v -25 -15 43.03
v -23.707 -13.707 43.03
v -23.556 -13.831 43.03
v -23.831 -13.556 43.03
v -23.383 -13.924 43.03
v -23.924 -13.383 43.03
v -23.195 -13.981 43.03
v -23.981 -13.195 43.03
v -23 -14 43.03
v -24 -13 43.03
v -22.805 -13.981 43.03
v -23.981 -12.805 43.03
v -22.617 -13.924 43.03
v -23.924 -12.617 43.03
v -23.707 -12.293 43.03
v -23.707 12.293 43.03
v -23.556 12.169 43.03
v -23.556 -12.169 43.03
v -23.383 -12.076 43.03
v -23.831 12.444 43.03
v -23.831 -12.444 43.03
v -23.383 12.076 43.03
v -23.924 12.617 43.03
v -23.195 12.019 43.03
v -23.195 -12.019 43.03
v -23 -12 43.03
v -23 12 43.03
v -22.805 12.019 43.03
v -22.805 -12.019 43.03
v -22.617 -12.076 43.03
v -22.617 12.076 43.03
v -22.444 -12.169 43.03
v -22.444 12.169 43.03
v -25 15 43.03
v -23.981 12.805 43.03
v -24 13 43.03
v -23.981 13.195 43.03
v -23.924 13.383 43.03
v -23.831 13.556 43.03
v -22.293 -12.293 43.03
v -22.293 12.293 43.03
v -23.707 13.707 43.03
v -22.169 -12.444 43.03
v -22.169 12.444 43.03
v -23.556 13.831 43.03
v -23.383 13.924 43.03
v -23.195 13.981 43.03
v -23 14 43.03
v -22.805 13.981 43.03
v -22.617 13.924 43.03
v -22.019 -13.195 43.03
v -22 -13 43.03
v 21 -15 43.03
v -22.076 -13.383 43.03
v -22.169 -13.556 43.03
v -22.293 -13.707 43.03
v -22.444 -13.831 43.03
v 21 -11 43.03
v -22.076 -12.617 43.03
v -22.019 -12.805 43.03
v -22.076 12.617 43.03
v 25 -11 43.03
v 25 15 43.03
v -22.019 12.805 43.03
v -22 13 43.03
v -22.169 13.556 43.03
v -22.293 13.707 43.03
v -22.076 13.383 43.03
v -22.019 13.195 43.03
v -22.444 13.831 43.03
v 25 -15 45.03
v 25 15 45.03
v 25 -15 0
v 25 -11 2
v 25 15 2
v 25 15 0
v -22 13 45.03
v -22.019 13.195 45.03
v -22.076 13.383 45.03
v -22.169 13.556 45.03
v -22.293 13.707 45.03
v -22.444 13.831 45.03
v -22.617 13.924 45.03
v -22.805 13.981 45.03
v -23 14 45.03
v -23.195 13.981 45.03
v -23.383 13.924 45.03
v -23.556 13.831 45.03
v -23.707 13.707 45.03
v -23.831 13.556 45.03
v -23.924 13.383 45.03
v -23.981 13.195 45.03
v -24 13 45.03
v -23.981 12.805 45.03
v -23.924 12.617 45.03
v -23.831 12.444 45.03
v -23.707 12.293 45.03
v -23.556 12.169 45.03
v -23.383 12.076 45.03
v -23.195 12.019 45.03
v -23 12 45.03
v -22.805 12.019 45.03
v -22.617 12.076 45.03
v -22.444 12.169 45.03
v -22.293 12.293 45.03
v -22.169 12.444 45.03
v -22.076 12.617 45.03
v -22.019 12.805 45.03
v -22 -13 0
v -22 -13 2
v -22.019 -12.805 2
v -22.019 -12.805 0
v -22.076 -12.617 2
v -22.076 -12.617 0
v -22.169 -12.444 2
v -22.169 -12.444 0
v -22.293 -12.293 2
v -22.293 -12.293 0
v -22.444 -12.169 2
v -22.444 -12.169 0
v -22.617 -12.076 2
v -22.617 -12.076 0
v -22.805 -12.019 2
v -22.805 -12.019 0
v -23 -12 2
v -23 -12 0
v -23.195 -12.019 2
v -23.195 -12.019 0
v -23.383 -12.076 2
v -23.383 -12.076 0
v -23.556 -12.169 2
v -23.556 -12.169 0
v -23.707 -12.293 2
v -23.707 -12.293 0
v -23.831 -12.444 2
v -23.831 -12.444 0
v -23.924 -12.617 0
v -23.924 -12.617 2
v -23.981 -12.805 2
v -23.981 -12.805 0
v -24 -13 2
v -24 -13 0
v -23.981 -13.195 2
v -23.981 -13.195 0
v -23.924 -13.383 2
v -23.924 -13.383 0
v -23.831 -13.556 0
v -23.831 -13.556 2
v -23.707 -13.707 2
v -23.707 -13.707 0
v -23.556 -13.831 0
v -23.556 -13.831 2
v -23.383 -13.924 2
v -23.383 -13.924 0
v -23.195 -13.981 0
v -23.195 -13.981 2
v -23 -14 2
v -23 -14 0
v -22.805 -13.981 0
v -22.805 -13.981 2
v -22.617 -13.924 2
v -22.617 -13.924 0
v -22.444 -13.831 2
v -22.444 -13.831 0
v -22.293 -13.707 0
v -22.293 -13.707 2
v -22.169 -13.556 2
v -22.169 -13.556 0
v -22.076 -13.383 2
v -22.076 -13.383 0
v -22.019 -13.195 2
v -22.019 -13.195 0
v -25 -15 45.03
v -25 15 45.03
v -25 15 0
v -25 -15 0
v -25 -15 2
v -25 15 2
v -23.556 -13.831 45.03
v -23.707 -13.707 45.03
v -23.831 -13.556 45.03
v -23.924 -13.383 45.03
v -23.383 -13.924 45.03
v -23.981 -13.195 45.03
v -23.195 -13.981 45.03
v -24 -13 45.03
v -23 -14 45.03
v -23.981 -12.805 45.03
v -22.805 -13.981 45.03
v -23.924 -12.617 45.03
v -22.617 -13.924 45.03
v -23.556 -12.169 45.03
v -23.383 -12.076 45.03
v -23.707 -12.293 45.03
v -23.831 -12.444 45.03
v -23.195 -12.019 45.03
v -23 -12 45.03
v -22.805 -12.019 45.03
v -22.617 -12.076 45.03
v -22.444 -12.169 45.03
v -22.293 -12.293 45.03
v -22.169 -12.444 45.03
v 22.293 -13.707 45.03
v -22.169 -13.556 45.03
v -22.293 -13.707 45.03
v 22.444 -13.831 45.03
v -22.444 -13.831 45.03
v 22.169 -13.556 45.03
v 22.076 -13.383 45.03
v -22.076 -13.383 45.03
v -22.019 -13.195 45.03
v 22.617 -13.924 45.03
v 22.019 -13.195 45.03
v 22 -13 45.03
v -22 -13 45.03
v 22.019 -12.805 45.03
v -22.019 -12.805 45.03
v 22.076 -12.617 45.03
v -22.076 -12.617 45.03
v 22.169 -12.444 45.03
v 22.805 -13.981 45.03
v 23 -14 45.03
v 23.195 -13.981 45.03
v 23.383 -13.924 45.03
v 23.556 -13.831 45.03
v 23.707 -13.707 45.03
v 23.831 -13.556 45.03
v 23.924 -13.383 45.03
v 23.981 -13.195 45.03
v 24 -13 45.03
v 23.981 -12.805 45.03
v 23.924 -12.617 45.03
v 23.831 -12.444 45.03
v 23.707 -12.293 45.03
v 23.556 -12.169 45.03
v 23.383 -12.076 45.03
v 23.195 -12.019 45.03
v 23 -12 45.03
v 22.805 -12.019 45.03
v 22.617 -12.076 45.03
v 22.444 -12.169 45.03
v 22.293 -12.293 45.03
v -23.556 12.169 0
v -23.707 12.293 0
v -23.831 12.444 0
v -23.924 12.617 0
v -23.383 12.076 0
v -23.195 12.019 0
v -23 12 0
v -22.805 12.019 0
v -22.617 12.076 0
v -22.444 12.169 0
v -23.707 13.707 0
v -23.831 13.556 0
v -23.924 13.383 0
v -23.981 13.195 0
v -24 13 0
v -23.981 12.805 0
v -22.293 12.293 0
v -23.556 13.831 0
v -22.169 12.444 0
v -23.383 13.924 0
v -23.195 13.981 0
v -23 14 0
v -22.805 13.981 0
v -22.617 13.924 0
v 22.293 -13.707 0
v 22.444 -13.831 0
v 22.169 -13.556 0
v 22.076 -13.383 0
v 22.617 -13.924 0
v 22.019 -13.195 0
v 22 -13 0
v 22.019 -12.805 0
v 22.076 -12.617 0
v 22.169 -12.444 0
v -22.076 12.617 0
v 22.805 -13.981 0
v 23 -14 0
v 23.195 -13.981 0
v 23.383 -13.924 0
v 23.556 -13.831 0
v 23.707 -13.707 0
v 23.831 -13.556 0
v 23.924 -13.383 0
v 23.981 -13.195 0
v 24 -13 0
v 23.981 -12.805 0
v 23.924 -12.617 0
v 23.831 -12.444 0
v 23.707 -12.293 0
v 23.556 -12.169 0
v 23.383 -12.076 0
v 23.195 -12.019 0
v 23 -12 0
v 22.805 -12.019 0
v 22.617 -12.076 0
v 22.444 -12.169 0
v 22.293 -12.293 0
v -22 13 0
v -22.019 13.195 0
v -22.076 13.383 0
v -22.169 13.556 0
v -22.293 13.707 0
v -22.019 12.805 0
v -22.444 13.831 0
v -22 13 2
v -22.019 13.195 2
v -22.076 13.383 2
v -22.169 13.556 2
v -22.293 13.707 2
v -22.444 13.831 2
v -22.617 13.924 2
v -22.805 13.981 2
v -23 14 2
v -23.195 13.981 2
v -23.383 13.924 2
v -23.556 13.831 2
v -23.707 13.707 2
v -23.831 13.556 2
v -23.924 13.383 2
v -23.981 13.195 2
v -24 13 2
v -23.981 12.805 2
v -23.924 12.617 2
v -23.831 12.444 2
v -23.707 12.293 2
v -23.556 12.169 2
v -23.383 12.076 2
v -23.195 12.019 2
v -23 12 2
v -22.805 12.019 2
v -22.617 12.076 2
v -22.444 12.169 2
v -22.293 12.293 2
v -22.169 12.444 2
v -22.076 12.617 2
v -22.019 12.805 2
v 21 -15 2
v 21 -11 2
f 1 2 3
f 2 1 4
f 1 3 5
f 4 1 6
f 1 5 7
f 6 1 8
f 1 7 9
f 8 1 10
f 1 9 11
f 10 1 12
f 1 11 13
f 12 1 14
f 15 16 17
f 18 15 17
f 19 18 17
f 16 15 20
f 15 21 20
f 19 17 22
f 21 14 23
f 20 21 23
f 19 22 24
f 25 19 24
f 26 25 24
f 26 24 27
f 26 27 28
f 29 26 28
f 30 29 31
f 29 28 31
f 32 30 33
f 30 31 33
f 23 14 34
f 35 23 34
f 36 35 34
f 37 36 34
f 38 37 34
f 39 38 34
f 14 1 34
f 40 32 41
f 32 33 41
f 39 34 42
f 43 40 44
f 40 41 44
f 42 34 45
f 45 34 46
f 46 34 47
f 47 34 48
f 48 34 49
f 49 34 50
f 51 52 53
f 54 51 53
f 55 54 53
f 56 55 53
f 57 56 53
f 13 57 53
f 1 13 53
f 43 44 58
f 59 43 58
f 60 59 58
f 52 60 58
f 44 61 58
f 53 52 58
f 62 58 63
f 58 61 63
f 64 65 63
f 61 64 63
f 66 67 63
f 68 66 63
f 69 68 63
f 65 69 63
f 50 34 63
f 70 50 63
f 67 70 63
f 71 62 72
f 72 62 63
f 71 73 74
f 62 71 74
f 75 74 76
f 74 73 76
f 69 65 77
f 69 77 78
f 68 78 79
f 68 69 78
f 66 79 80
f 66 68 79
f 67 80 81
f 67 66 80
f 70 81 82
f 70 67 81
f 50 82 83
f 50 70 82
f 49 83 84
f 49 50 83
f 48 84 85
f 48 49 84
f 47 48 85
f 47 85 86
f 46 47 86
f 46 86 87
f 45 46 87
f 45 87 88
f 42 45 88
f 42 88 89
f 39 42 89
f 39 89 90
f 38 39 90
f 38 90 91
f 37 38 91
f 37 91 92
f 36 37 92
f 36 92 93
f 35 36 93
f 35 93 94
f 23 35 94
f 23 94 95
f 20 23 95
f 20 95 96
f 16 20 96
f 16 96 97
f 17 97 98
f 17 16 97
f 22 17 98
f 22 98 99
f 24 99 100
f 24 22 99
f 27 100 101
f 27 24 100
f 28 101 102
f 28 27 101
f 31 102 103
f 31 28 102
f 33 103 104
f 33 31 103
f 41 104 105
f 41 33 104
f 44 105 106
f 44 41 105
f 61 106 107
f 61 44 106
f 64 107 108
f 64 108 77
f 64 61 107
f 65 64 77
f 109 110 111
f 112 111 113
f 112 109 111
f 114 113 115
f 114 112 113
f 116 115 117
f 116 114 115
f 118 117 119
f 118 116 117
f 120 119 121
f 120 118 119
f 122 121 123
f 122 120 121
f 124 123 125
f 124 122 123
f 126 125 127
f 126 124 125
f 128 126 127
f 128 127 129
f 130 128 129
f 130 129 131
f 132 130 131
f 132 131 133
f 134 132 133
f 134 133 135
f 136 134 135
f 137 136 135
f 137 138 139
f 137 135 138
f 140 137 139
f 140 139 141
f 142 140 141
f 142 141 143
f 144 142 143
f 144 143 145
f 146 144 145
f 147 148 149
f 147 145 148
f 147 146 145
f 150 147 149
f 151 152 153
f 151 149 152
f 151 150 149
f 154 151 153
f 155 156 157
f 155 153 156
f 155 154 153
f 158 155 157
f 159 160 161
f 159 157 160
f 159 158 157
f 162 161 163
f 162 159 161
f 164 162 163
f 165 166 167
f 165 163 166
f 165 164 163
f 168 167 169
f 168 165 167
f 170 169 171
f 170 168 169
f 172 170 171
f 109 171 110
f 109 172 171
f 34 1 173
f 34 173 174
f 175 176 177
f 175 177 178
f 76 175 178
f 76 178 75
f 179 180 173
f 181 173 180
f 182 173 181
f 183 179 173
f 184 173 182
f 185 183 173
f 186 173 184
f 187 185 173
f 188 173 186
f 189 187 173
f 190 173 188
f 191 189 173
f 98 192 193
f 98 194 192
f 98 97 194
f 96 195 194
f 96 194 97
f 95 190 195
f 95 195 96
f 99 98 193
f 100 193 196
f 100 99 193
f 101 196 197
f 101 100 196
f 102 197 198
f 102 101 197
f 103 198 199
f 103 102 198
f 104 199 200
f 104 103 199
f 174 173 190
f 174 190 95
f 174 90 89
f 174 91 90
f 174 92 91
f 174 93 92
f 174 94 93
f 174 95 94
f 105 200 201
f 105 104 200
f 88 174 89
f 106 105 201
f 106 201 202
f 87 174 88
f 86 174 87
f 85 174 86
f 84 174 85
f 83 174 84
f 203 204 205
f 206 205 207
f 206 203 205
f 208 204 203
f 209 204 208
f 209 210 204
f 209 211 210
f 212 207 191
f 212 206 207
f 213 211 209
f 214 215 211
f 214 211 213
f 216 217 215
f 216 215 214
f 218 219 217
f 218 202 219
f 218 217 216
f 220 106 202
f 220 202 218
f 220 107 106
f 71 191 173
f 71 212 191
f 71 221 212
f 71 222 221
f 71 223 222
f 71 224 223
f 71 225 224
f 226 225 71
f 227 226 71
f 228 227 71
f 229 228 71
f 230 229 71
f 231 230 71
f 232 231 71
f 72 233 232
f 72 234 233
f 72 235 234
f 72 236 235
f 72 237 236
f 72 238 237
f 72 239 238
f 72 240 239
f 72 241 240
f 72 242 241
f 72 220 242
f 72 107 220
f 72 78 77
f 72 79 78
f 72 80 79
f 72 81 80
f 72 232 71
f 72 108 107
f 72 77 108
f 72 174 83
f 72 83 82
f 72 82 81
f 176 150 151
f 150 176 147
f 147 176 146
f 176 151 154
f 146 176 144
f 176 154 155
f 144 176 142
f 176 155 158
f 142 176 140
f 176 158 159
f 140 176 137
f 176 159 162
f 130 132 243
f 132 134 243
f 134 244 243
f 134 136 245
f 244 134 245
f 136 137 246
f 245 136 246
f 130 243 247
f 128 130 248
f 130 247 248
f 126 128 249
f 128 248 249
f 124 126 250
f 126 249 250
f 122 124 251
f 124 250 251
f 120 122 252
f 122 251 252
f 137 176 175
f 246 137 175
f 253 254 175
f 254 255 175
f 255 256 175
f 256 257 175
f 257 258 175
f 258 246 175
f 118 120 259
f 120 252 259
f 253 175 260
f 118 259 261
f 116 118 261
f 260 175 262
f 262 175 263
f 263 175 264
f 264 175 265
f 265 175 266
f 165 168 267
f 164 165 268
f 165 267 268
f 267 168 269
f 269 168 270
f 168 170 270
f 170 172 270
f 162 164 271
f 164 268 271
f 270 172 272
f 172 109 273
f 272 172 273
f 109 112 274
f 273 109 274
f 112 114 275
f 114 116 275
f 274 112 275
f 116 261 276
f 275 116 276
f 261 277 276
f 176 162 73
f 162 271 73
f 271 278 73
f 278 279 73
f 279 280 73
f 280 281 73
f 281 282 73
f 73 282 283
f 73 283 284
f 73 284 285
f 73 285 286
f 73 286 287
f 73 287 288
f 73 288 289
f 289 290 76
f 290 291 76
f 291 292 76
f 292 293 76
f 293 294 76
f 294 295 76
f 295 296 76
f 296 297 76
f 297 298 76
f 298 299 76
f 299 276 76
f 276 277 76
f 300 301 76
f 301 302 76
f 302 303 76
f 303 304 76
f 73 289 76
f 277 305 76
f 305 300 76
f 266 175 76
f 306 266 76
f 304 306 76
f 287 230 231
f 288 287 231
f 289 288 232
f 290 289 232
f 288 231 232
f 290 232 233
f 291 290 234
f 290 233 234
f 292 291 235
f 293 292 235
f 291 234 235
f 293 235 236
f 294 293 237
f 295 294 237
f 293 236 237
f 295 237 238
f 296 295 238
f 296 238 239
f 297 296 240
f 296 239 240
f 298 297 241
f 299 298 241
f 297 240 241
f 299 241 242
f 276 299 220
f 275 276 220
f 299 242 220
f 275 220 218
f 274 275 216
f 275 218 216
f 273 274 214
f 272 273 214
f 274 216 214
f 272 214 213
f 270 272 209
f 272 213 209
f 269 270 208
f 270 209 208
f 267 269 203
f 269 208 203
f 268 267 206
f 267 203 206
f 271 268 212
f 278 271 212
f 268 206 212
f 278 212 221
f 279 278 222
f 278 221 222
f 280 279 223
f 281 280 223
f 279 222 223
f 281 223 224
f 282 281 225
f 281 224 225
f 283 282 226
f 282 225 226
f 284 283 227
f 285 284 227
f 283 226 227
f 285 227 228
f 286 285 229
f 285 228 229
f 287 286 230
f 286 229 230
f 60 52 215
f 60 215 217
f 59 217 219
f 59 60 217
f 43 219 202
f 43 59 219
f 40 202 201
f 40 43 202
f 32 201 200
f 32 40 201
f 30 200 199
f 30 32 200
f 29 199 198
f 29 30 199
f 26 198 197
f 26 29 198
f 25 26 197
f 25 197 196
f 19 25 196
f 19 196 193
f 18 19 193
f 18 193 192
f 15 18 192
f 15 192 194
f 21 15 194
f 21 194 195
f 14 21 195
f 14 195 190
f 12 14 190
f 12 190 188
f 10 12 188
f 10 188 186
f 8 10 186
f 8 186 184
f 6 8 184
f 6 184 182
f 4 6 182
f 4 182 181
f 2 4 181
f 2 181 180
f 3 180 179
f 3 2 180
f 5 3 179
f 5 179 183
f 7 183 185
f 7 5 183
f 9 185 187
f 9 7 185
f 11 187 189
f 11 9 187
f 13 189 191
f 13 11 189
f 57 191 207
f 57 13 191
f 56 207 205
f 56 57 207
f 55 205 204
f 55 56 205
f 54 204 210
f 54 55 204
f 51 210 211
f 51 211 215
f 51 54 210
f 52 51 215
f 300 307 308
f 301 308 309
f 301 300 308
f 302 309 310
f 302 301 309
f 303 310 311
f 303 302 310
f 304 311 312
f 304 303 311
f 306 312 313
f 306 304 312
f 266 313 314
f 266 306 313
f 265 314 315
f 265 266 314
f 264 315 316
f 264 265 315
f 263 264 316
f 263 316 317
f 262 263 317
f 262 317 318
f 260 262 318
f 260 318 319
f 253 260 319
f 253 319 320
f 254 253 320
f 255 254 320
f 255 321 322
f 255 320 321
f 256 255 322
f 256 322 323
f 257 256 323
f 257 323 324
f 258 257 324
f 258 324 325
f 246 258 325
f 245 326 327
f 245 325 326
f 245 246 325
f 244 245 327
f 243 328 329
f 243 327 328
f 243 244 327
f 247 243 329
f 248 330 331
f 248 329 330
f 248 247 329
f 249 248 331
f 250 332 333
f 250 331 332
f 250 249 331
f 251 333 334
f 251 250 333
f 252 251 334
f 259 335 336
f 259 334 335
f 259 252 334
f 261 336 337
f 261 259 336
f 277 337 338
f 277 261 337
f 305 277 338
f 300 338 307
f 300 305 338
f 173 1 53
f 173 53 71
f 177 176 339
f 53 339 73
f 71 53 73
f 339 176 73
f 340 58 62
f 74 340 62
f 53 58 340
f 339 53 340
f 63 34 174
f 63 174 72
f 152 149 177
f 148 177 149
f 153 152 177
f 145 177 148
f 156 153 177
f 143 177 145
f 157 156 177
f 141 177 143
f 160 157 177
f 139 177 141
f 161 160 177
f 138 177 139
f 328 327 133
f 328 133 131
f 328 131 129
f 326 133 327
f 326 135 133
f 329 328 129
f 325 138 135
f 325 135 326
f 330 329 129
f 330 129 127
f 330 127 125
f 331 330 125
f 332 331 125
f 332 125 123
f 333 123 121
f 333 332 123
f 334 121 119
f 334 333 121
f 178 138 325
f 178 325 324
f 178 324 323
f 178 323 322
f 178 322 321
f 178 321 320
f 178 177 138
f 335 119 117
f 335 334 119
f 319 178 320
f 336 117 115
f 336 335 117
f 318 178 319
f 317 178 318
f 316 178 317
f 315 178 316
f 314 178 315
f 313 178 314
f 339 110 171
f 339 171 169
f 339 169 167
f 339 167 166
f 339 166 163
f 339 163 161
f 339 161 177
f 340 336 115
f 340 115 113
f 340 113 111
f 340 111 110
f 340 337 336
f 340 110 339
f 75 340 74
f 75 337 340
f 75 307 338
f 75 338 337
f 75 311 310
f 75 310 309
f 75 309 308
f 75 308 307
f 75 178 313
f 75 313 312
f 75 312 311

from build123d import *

# Parameters (mm, degrees)
SKETCH_1_W          = 50
SKETCH_1_H          = 30
SKETCH_1_R          = 1
EXTRUDE_1_DEPTH     = 45.03
SKETCH_2_W          = 46
SKETCH_2_H          = 41.03
CUT_EXTRUDE_1_DEPTH = 45.03
SKETCH_3_R          = 1
CUT_EXTRUDE_2_DEPTH = 45.03
SKETCH_4_W          = 4
SKETCH_4_H          = 41.03
CUT_EXTRUDE_3_DEPTH = 26


with BuildPart() as part:
    # 草图1 → 凸台-拉伸1 (new body)
    with BuildSketch(Plane.XY):
        Rectangle(SKETCH_1_W, SKETCH_1_H)
        with Locations((-23, -13)):
            Circle(SKETCH_1_R, mode=Mode.SUBTRACT)
        with Locations((-23, 13)):
            Circle(SKETCH_1_R, mode=Mode.SUBTRACT)
    extrude(amount=EXTRUDE_1_DEPTH)

    # 草图2 → 切除-拉伸1 (cut)
    with BuildSketch(Plane(origin=(0, 15, 0), x_dir=(1, 0, 0), z_dir=(0, 1, 0))):
        with Locations((-2, -22.515)):
            Rectangle(SKETCH_2_W, SKETCH_2_H)
    extrude(amount=-CUT_EXTRUDE_1_DEPTH, mode=Mode.SUBTRACT)

    # 草图3 → 切除-拉伸2 (cut)
    with BuildSketch(Plane.XY.offset(45.03)):
        with Locations((23, -13)):
            Circle(SKETCH_3_R)
    extrude(amount=-CUT_EXTRUDE_2_DEPTH, mode=Mode.SUBTRACT)

    # 草图4 → 切除-拉伸3 (cut)
    with BuildSketch(Plane(origin=(0, 15, 0), x_dir=(1, 0, 0), z_dir=(0, 1, 0))):
        with Locations((23, -22.515)):
            Rectangle(SKETCH_4_W, SKETCH_4_H)
    extrude(amount=-CUT_EXTRUDE_3_DEPTH, mode=Mode.SUBTRACT)


solid = part.part
